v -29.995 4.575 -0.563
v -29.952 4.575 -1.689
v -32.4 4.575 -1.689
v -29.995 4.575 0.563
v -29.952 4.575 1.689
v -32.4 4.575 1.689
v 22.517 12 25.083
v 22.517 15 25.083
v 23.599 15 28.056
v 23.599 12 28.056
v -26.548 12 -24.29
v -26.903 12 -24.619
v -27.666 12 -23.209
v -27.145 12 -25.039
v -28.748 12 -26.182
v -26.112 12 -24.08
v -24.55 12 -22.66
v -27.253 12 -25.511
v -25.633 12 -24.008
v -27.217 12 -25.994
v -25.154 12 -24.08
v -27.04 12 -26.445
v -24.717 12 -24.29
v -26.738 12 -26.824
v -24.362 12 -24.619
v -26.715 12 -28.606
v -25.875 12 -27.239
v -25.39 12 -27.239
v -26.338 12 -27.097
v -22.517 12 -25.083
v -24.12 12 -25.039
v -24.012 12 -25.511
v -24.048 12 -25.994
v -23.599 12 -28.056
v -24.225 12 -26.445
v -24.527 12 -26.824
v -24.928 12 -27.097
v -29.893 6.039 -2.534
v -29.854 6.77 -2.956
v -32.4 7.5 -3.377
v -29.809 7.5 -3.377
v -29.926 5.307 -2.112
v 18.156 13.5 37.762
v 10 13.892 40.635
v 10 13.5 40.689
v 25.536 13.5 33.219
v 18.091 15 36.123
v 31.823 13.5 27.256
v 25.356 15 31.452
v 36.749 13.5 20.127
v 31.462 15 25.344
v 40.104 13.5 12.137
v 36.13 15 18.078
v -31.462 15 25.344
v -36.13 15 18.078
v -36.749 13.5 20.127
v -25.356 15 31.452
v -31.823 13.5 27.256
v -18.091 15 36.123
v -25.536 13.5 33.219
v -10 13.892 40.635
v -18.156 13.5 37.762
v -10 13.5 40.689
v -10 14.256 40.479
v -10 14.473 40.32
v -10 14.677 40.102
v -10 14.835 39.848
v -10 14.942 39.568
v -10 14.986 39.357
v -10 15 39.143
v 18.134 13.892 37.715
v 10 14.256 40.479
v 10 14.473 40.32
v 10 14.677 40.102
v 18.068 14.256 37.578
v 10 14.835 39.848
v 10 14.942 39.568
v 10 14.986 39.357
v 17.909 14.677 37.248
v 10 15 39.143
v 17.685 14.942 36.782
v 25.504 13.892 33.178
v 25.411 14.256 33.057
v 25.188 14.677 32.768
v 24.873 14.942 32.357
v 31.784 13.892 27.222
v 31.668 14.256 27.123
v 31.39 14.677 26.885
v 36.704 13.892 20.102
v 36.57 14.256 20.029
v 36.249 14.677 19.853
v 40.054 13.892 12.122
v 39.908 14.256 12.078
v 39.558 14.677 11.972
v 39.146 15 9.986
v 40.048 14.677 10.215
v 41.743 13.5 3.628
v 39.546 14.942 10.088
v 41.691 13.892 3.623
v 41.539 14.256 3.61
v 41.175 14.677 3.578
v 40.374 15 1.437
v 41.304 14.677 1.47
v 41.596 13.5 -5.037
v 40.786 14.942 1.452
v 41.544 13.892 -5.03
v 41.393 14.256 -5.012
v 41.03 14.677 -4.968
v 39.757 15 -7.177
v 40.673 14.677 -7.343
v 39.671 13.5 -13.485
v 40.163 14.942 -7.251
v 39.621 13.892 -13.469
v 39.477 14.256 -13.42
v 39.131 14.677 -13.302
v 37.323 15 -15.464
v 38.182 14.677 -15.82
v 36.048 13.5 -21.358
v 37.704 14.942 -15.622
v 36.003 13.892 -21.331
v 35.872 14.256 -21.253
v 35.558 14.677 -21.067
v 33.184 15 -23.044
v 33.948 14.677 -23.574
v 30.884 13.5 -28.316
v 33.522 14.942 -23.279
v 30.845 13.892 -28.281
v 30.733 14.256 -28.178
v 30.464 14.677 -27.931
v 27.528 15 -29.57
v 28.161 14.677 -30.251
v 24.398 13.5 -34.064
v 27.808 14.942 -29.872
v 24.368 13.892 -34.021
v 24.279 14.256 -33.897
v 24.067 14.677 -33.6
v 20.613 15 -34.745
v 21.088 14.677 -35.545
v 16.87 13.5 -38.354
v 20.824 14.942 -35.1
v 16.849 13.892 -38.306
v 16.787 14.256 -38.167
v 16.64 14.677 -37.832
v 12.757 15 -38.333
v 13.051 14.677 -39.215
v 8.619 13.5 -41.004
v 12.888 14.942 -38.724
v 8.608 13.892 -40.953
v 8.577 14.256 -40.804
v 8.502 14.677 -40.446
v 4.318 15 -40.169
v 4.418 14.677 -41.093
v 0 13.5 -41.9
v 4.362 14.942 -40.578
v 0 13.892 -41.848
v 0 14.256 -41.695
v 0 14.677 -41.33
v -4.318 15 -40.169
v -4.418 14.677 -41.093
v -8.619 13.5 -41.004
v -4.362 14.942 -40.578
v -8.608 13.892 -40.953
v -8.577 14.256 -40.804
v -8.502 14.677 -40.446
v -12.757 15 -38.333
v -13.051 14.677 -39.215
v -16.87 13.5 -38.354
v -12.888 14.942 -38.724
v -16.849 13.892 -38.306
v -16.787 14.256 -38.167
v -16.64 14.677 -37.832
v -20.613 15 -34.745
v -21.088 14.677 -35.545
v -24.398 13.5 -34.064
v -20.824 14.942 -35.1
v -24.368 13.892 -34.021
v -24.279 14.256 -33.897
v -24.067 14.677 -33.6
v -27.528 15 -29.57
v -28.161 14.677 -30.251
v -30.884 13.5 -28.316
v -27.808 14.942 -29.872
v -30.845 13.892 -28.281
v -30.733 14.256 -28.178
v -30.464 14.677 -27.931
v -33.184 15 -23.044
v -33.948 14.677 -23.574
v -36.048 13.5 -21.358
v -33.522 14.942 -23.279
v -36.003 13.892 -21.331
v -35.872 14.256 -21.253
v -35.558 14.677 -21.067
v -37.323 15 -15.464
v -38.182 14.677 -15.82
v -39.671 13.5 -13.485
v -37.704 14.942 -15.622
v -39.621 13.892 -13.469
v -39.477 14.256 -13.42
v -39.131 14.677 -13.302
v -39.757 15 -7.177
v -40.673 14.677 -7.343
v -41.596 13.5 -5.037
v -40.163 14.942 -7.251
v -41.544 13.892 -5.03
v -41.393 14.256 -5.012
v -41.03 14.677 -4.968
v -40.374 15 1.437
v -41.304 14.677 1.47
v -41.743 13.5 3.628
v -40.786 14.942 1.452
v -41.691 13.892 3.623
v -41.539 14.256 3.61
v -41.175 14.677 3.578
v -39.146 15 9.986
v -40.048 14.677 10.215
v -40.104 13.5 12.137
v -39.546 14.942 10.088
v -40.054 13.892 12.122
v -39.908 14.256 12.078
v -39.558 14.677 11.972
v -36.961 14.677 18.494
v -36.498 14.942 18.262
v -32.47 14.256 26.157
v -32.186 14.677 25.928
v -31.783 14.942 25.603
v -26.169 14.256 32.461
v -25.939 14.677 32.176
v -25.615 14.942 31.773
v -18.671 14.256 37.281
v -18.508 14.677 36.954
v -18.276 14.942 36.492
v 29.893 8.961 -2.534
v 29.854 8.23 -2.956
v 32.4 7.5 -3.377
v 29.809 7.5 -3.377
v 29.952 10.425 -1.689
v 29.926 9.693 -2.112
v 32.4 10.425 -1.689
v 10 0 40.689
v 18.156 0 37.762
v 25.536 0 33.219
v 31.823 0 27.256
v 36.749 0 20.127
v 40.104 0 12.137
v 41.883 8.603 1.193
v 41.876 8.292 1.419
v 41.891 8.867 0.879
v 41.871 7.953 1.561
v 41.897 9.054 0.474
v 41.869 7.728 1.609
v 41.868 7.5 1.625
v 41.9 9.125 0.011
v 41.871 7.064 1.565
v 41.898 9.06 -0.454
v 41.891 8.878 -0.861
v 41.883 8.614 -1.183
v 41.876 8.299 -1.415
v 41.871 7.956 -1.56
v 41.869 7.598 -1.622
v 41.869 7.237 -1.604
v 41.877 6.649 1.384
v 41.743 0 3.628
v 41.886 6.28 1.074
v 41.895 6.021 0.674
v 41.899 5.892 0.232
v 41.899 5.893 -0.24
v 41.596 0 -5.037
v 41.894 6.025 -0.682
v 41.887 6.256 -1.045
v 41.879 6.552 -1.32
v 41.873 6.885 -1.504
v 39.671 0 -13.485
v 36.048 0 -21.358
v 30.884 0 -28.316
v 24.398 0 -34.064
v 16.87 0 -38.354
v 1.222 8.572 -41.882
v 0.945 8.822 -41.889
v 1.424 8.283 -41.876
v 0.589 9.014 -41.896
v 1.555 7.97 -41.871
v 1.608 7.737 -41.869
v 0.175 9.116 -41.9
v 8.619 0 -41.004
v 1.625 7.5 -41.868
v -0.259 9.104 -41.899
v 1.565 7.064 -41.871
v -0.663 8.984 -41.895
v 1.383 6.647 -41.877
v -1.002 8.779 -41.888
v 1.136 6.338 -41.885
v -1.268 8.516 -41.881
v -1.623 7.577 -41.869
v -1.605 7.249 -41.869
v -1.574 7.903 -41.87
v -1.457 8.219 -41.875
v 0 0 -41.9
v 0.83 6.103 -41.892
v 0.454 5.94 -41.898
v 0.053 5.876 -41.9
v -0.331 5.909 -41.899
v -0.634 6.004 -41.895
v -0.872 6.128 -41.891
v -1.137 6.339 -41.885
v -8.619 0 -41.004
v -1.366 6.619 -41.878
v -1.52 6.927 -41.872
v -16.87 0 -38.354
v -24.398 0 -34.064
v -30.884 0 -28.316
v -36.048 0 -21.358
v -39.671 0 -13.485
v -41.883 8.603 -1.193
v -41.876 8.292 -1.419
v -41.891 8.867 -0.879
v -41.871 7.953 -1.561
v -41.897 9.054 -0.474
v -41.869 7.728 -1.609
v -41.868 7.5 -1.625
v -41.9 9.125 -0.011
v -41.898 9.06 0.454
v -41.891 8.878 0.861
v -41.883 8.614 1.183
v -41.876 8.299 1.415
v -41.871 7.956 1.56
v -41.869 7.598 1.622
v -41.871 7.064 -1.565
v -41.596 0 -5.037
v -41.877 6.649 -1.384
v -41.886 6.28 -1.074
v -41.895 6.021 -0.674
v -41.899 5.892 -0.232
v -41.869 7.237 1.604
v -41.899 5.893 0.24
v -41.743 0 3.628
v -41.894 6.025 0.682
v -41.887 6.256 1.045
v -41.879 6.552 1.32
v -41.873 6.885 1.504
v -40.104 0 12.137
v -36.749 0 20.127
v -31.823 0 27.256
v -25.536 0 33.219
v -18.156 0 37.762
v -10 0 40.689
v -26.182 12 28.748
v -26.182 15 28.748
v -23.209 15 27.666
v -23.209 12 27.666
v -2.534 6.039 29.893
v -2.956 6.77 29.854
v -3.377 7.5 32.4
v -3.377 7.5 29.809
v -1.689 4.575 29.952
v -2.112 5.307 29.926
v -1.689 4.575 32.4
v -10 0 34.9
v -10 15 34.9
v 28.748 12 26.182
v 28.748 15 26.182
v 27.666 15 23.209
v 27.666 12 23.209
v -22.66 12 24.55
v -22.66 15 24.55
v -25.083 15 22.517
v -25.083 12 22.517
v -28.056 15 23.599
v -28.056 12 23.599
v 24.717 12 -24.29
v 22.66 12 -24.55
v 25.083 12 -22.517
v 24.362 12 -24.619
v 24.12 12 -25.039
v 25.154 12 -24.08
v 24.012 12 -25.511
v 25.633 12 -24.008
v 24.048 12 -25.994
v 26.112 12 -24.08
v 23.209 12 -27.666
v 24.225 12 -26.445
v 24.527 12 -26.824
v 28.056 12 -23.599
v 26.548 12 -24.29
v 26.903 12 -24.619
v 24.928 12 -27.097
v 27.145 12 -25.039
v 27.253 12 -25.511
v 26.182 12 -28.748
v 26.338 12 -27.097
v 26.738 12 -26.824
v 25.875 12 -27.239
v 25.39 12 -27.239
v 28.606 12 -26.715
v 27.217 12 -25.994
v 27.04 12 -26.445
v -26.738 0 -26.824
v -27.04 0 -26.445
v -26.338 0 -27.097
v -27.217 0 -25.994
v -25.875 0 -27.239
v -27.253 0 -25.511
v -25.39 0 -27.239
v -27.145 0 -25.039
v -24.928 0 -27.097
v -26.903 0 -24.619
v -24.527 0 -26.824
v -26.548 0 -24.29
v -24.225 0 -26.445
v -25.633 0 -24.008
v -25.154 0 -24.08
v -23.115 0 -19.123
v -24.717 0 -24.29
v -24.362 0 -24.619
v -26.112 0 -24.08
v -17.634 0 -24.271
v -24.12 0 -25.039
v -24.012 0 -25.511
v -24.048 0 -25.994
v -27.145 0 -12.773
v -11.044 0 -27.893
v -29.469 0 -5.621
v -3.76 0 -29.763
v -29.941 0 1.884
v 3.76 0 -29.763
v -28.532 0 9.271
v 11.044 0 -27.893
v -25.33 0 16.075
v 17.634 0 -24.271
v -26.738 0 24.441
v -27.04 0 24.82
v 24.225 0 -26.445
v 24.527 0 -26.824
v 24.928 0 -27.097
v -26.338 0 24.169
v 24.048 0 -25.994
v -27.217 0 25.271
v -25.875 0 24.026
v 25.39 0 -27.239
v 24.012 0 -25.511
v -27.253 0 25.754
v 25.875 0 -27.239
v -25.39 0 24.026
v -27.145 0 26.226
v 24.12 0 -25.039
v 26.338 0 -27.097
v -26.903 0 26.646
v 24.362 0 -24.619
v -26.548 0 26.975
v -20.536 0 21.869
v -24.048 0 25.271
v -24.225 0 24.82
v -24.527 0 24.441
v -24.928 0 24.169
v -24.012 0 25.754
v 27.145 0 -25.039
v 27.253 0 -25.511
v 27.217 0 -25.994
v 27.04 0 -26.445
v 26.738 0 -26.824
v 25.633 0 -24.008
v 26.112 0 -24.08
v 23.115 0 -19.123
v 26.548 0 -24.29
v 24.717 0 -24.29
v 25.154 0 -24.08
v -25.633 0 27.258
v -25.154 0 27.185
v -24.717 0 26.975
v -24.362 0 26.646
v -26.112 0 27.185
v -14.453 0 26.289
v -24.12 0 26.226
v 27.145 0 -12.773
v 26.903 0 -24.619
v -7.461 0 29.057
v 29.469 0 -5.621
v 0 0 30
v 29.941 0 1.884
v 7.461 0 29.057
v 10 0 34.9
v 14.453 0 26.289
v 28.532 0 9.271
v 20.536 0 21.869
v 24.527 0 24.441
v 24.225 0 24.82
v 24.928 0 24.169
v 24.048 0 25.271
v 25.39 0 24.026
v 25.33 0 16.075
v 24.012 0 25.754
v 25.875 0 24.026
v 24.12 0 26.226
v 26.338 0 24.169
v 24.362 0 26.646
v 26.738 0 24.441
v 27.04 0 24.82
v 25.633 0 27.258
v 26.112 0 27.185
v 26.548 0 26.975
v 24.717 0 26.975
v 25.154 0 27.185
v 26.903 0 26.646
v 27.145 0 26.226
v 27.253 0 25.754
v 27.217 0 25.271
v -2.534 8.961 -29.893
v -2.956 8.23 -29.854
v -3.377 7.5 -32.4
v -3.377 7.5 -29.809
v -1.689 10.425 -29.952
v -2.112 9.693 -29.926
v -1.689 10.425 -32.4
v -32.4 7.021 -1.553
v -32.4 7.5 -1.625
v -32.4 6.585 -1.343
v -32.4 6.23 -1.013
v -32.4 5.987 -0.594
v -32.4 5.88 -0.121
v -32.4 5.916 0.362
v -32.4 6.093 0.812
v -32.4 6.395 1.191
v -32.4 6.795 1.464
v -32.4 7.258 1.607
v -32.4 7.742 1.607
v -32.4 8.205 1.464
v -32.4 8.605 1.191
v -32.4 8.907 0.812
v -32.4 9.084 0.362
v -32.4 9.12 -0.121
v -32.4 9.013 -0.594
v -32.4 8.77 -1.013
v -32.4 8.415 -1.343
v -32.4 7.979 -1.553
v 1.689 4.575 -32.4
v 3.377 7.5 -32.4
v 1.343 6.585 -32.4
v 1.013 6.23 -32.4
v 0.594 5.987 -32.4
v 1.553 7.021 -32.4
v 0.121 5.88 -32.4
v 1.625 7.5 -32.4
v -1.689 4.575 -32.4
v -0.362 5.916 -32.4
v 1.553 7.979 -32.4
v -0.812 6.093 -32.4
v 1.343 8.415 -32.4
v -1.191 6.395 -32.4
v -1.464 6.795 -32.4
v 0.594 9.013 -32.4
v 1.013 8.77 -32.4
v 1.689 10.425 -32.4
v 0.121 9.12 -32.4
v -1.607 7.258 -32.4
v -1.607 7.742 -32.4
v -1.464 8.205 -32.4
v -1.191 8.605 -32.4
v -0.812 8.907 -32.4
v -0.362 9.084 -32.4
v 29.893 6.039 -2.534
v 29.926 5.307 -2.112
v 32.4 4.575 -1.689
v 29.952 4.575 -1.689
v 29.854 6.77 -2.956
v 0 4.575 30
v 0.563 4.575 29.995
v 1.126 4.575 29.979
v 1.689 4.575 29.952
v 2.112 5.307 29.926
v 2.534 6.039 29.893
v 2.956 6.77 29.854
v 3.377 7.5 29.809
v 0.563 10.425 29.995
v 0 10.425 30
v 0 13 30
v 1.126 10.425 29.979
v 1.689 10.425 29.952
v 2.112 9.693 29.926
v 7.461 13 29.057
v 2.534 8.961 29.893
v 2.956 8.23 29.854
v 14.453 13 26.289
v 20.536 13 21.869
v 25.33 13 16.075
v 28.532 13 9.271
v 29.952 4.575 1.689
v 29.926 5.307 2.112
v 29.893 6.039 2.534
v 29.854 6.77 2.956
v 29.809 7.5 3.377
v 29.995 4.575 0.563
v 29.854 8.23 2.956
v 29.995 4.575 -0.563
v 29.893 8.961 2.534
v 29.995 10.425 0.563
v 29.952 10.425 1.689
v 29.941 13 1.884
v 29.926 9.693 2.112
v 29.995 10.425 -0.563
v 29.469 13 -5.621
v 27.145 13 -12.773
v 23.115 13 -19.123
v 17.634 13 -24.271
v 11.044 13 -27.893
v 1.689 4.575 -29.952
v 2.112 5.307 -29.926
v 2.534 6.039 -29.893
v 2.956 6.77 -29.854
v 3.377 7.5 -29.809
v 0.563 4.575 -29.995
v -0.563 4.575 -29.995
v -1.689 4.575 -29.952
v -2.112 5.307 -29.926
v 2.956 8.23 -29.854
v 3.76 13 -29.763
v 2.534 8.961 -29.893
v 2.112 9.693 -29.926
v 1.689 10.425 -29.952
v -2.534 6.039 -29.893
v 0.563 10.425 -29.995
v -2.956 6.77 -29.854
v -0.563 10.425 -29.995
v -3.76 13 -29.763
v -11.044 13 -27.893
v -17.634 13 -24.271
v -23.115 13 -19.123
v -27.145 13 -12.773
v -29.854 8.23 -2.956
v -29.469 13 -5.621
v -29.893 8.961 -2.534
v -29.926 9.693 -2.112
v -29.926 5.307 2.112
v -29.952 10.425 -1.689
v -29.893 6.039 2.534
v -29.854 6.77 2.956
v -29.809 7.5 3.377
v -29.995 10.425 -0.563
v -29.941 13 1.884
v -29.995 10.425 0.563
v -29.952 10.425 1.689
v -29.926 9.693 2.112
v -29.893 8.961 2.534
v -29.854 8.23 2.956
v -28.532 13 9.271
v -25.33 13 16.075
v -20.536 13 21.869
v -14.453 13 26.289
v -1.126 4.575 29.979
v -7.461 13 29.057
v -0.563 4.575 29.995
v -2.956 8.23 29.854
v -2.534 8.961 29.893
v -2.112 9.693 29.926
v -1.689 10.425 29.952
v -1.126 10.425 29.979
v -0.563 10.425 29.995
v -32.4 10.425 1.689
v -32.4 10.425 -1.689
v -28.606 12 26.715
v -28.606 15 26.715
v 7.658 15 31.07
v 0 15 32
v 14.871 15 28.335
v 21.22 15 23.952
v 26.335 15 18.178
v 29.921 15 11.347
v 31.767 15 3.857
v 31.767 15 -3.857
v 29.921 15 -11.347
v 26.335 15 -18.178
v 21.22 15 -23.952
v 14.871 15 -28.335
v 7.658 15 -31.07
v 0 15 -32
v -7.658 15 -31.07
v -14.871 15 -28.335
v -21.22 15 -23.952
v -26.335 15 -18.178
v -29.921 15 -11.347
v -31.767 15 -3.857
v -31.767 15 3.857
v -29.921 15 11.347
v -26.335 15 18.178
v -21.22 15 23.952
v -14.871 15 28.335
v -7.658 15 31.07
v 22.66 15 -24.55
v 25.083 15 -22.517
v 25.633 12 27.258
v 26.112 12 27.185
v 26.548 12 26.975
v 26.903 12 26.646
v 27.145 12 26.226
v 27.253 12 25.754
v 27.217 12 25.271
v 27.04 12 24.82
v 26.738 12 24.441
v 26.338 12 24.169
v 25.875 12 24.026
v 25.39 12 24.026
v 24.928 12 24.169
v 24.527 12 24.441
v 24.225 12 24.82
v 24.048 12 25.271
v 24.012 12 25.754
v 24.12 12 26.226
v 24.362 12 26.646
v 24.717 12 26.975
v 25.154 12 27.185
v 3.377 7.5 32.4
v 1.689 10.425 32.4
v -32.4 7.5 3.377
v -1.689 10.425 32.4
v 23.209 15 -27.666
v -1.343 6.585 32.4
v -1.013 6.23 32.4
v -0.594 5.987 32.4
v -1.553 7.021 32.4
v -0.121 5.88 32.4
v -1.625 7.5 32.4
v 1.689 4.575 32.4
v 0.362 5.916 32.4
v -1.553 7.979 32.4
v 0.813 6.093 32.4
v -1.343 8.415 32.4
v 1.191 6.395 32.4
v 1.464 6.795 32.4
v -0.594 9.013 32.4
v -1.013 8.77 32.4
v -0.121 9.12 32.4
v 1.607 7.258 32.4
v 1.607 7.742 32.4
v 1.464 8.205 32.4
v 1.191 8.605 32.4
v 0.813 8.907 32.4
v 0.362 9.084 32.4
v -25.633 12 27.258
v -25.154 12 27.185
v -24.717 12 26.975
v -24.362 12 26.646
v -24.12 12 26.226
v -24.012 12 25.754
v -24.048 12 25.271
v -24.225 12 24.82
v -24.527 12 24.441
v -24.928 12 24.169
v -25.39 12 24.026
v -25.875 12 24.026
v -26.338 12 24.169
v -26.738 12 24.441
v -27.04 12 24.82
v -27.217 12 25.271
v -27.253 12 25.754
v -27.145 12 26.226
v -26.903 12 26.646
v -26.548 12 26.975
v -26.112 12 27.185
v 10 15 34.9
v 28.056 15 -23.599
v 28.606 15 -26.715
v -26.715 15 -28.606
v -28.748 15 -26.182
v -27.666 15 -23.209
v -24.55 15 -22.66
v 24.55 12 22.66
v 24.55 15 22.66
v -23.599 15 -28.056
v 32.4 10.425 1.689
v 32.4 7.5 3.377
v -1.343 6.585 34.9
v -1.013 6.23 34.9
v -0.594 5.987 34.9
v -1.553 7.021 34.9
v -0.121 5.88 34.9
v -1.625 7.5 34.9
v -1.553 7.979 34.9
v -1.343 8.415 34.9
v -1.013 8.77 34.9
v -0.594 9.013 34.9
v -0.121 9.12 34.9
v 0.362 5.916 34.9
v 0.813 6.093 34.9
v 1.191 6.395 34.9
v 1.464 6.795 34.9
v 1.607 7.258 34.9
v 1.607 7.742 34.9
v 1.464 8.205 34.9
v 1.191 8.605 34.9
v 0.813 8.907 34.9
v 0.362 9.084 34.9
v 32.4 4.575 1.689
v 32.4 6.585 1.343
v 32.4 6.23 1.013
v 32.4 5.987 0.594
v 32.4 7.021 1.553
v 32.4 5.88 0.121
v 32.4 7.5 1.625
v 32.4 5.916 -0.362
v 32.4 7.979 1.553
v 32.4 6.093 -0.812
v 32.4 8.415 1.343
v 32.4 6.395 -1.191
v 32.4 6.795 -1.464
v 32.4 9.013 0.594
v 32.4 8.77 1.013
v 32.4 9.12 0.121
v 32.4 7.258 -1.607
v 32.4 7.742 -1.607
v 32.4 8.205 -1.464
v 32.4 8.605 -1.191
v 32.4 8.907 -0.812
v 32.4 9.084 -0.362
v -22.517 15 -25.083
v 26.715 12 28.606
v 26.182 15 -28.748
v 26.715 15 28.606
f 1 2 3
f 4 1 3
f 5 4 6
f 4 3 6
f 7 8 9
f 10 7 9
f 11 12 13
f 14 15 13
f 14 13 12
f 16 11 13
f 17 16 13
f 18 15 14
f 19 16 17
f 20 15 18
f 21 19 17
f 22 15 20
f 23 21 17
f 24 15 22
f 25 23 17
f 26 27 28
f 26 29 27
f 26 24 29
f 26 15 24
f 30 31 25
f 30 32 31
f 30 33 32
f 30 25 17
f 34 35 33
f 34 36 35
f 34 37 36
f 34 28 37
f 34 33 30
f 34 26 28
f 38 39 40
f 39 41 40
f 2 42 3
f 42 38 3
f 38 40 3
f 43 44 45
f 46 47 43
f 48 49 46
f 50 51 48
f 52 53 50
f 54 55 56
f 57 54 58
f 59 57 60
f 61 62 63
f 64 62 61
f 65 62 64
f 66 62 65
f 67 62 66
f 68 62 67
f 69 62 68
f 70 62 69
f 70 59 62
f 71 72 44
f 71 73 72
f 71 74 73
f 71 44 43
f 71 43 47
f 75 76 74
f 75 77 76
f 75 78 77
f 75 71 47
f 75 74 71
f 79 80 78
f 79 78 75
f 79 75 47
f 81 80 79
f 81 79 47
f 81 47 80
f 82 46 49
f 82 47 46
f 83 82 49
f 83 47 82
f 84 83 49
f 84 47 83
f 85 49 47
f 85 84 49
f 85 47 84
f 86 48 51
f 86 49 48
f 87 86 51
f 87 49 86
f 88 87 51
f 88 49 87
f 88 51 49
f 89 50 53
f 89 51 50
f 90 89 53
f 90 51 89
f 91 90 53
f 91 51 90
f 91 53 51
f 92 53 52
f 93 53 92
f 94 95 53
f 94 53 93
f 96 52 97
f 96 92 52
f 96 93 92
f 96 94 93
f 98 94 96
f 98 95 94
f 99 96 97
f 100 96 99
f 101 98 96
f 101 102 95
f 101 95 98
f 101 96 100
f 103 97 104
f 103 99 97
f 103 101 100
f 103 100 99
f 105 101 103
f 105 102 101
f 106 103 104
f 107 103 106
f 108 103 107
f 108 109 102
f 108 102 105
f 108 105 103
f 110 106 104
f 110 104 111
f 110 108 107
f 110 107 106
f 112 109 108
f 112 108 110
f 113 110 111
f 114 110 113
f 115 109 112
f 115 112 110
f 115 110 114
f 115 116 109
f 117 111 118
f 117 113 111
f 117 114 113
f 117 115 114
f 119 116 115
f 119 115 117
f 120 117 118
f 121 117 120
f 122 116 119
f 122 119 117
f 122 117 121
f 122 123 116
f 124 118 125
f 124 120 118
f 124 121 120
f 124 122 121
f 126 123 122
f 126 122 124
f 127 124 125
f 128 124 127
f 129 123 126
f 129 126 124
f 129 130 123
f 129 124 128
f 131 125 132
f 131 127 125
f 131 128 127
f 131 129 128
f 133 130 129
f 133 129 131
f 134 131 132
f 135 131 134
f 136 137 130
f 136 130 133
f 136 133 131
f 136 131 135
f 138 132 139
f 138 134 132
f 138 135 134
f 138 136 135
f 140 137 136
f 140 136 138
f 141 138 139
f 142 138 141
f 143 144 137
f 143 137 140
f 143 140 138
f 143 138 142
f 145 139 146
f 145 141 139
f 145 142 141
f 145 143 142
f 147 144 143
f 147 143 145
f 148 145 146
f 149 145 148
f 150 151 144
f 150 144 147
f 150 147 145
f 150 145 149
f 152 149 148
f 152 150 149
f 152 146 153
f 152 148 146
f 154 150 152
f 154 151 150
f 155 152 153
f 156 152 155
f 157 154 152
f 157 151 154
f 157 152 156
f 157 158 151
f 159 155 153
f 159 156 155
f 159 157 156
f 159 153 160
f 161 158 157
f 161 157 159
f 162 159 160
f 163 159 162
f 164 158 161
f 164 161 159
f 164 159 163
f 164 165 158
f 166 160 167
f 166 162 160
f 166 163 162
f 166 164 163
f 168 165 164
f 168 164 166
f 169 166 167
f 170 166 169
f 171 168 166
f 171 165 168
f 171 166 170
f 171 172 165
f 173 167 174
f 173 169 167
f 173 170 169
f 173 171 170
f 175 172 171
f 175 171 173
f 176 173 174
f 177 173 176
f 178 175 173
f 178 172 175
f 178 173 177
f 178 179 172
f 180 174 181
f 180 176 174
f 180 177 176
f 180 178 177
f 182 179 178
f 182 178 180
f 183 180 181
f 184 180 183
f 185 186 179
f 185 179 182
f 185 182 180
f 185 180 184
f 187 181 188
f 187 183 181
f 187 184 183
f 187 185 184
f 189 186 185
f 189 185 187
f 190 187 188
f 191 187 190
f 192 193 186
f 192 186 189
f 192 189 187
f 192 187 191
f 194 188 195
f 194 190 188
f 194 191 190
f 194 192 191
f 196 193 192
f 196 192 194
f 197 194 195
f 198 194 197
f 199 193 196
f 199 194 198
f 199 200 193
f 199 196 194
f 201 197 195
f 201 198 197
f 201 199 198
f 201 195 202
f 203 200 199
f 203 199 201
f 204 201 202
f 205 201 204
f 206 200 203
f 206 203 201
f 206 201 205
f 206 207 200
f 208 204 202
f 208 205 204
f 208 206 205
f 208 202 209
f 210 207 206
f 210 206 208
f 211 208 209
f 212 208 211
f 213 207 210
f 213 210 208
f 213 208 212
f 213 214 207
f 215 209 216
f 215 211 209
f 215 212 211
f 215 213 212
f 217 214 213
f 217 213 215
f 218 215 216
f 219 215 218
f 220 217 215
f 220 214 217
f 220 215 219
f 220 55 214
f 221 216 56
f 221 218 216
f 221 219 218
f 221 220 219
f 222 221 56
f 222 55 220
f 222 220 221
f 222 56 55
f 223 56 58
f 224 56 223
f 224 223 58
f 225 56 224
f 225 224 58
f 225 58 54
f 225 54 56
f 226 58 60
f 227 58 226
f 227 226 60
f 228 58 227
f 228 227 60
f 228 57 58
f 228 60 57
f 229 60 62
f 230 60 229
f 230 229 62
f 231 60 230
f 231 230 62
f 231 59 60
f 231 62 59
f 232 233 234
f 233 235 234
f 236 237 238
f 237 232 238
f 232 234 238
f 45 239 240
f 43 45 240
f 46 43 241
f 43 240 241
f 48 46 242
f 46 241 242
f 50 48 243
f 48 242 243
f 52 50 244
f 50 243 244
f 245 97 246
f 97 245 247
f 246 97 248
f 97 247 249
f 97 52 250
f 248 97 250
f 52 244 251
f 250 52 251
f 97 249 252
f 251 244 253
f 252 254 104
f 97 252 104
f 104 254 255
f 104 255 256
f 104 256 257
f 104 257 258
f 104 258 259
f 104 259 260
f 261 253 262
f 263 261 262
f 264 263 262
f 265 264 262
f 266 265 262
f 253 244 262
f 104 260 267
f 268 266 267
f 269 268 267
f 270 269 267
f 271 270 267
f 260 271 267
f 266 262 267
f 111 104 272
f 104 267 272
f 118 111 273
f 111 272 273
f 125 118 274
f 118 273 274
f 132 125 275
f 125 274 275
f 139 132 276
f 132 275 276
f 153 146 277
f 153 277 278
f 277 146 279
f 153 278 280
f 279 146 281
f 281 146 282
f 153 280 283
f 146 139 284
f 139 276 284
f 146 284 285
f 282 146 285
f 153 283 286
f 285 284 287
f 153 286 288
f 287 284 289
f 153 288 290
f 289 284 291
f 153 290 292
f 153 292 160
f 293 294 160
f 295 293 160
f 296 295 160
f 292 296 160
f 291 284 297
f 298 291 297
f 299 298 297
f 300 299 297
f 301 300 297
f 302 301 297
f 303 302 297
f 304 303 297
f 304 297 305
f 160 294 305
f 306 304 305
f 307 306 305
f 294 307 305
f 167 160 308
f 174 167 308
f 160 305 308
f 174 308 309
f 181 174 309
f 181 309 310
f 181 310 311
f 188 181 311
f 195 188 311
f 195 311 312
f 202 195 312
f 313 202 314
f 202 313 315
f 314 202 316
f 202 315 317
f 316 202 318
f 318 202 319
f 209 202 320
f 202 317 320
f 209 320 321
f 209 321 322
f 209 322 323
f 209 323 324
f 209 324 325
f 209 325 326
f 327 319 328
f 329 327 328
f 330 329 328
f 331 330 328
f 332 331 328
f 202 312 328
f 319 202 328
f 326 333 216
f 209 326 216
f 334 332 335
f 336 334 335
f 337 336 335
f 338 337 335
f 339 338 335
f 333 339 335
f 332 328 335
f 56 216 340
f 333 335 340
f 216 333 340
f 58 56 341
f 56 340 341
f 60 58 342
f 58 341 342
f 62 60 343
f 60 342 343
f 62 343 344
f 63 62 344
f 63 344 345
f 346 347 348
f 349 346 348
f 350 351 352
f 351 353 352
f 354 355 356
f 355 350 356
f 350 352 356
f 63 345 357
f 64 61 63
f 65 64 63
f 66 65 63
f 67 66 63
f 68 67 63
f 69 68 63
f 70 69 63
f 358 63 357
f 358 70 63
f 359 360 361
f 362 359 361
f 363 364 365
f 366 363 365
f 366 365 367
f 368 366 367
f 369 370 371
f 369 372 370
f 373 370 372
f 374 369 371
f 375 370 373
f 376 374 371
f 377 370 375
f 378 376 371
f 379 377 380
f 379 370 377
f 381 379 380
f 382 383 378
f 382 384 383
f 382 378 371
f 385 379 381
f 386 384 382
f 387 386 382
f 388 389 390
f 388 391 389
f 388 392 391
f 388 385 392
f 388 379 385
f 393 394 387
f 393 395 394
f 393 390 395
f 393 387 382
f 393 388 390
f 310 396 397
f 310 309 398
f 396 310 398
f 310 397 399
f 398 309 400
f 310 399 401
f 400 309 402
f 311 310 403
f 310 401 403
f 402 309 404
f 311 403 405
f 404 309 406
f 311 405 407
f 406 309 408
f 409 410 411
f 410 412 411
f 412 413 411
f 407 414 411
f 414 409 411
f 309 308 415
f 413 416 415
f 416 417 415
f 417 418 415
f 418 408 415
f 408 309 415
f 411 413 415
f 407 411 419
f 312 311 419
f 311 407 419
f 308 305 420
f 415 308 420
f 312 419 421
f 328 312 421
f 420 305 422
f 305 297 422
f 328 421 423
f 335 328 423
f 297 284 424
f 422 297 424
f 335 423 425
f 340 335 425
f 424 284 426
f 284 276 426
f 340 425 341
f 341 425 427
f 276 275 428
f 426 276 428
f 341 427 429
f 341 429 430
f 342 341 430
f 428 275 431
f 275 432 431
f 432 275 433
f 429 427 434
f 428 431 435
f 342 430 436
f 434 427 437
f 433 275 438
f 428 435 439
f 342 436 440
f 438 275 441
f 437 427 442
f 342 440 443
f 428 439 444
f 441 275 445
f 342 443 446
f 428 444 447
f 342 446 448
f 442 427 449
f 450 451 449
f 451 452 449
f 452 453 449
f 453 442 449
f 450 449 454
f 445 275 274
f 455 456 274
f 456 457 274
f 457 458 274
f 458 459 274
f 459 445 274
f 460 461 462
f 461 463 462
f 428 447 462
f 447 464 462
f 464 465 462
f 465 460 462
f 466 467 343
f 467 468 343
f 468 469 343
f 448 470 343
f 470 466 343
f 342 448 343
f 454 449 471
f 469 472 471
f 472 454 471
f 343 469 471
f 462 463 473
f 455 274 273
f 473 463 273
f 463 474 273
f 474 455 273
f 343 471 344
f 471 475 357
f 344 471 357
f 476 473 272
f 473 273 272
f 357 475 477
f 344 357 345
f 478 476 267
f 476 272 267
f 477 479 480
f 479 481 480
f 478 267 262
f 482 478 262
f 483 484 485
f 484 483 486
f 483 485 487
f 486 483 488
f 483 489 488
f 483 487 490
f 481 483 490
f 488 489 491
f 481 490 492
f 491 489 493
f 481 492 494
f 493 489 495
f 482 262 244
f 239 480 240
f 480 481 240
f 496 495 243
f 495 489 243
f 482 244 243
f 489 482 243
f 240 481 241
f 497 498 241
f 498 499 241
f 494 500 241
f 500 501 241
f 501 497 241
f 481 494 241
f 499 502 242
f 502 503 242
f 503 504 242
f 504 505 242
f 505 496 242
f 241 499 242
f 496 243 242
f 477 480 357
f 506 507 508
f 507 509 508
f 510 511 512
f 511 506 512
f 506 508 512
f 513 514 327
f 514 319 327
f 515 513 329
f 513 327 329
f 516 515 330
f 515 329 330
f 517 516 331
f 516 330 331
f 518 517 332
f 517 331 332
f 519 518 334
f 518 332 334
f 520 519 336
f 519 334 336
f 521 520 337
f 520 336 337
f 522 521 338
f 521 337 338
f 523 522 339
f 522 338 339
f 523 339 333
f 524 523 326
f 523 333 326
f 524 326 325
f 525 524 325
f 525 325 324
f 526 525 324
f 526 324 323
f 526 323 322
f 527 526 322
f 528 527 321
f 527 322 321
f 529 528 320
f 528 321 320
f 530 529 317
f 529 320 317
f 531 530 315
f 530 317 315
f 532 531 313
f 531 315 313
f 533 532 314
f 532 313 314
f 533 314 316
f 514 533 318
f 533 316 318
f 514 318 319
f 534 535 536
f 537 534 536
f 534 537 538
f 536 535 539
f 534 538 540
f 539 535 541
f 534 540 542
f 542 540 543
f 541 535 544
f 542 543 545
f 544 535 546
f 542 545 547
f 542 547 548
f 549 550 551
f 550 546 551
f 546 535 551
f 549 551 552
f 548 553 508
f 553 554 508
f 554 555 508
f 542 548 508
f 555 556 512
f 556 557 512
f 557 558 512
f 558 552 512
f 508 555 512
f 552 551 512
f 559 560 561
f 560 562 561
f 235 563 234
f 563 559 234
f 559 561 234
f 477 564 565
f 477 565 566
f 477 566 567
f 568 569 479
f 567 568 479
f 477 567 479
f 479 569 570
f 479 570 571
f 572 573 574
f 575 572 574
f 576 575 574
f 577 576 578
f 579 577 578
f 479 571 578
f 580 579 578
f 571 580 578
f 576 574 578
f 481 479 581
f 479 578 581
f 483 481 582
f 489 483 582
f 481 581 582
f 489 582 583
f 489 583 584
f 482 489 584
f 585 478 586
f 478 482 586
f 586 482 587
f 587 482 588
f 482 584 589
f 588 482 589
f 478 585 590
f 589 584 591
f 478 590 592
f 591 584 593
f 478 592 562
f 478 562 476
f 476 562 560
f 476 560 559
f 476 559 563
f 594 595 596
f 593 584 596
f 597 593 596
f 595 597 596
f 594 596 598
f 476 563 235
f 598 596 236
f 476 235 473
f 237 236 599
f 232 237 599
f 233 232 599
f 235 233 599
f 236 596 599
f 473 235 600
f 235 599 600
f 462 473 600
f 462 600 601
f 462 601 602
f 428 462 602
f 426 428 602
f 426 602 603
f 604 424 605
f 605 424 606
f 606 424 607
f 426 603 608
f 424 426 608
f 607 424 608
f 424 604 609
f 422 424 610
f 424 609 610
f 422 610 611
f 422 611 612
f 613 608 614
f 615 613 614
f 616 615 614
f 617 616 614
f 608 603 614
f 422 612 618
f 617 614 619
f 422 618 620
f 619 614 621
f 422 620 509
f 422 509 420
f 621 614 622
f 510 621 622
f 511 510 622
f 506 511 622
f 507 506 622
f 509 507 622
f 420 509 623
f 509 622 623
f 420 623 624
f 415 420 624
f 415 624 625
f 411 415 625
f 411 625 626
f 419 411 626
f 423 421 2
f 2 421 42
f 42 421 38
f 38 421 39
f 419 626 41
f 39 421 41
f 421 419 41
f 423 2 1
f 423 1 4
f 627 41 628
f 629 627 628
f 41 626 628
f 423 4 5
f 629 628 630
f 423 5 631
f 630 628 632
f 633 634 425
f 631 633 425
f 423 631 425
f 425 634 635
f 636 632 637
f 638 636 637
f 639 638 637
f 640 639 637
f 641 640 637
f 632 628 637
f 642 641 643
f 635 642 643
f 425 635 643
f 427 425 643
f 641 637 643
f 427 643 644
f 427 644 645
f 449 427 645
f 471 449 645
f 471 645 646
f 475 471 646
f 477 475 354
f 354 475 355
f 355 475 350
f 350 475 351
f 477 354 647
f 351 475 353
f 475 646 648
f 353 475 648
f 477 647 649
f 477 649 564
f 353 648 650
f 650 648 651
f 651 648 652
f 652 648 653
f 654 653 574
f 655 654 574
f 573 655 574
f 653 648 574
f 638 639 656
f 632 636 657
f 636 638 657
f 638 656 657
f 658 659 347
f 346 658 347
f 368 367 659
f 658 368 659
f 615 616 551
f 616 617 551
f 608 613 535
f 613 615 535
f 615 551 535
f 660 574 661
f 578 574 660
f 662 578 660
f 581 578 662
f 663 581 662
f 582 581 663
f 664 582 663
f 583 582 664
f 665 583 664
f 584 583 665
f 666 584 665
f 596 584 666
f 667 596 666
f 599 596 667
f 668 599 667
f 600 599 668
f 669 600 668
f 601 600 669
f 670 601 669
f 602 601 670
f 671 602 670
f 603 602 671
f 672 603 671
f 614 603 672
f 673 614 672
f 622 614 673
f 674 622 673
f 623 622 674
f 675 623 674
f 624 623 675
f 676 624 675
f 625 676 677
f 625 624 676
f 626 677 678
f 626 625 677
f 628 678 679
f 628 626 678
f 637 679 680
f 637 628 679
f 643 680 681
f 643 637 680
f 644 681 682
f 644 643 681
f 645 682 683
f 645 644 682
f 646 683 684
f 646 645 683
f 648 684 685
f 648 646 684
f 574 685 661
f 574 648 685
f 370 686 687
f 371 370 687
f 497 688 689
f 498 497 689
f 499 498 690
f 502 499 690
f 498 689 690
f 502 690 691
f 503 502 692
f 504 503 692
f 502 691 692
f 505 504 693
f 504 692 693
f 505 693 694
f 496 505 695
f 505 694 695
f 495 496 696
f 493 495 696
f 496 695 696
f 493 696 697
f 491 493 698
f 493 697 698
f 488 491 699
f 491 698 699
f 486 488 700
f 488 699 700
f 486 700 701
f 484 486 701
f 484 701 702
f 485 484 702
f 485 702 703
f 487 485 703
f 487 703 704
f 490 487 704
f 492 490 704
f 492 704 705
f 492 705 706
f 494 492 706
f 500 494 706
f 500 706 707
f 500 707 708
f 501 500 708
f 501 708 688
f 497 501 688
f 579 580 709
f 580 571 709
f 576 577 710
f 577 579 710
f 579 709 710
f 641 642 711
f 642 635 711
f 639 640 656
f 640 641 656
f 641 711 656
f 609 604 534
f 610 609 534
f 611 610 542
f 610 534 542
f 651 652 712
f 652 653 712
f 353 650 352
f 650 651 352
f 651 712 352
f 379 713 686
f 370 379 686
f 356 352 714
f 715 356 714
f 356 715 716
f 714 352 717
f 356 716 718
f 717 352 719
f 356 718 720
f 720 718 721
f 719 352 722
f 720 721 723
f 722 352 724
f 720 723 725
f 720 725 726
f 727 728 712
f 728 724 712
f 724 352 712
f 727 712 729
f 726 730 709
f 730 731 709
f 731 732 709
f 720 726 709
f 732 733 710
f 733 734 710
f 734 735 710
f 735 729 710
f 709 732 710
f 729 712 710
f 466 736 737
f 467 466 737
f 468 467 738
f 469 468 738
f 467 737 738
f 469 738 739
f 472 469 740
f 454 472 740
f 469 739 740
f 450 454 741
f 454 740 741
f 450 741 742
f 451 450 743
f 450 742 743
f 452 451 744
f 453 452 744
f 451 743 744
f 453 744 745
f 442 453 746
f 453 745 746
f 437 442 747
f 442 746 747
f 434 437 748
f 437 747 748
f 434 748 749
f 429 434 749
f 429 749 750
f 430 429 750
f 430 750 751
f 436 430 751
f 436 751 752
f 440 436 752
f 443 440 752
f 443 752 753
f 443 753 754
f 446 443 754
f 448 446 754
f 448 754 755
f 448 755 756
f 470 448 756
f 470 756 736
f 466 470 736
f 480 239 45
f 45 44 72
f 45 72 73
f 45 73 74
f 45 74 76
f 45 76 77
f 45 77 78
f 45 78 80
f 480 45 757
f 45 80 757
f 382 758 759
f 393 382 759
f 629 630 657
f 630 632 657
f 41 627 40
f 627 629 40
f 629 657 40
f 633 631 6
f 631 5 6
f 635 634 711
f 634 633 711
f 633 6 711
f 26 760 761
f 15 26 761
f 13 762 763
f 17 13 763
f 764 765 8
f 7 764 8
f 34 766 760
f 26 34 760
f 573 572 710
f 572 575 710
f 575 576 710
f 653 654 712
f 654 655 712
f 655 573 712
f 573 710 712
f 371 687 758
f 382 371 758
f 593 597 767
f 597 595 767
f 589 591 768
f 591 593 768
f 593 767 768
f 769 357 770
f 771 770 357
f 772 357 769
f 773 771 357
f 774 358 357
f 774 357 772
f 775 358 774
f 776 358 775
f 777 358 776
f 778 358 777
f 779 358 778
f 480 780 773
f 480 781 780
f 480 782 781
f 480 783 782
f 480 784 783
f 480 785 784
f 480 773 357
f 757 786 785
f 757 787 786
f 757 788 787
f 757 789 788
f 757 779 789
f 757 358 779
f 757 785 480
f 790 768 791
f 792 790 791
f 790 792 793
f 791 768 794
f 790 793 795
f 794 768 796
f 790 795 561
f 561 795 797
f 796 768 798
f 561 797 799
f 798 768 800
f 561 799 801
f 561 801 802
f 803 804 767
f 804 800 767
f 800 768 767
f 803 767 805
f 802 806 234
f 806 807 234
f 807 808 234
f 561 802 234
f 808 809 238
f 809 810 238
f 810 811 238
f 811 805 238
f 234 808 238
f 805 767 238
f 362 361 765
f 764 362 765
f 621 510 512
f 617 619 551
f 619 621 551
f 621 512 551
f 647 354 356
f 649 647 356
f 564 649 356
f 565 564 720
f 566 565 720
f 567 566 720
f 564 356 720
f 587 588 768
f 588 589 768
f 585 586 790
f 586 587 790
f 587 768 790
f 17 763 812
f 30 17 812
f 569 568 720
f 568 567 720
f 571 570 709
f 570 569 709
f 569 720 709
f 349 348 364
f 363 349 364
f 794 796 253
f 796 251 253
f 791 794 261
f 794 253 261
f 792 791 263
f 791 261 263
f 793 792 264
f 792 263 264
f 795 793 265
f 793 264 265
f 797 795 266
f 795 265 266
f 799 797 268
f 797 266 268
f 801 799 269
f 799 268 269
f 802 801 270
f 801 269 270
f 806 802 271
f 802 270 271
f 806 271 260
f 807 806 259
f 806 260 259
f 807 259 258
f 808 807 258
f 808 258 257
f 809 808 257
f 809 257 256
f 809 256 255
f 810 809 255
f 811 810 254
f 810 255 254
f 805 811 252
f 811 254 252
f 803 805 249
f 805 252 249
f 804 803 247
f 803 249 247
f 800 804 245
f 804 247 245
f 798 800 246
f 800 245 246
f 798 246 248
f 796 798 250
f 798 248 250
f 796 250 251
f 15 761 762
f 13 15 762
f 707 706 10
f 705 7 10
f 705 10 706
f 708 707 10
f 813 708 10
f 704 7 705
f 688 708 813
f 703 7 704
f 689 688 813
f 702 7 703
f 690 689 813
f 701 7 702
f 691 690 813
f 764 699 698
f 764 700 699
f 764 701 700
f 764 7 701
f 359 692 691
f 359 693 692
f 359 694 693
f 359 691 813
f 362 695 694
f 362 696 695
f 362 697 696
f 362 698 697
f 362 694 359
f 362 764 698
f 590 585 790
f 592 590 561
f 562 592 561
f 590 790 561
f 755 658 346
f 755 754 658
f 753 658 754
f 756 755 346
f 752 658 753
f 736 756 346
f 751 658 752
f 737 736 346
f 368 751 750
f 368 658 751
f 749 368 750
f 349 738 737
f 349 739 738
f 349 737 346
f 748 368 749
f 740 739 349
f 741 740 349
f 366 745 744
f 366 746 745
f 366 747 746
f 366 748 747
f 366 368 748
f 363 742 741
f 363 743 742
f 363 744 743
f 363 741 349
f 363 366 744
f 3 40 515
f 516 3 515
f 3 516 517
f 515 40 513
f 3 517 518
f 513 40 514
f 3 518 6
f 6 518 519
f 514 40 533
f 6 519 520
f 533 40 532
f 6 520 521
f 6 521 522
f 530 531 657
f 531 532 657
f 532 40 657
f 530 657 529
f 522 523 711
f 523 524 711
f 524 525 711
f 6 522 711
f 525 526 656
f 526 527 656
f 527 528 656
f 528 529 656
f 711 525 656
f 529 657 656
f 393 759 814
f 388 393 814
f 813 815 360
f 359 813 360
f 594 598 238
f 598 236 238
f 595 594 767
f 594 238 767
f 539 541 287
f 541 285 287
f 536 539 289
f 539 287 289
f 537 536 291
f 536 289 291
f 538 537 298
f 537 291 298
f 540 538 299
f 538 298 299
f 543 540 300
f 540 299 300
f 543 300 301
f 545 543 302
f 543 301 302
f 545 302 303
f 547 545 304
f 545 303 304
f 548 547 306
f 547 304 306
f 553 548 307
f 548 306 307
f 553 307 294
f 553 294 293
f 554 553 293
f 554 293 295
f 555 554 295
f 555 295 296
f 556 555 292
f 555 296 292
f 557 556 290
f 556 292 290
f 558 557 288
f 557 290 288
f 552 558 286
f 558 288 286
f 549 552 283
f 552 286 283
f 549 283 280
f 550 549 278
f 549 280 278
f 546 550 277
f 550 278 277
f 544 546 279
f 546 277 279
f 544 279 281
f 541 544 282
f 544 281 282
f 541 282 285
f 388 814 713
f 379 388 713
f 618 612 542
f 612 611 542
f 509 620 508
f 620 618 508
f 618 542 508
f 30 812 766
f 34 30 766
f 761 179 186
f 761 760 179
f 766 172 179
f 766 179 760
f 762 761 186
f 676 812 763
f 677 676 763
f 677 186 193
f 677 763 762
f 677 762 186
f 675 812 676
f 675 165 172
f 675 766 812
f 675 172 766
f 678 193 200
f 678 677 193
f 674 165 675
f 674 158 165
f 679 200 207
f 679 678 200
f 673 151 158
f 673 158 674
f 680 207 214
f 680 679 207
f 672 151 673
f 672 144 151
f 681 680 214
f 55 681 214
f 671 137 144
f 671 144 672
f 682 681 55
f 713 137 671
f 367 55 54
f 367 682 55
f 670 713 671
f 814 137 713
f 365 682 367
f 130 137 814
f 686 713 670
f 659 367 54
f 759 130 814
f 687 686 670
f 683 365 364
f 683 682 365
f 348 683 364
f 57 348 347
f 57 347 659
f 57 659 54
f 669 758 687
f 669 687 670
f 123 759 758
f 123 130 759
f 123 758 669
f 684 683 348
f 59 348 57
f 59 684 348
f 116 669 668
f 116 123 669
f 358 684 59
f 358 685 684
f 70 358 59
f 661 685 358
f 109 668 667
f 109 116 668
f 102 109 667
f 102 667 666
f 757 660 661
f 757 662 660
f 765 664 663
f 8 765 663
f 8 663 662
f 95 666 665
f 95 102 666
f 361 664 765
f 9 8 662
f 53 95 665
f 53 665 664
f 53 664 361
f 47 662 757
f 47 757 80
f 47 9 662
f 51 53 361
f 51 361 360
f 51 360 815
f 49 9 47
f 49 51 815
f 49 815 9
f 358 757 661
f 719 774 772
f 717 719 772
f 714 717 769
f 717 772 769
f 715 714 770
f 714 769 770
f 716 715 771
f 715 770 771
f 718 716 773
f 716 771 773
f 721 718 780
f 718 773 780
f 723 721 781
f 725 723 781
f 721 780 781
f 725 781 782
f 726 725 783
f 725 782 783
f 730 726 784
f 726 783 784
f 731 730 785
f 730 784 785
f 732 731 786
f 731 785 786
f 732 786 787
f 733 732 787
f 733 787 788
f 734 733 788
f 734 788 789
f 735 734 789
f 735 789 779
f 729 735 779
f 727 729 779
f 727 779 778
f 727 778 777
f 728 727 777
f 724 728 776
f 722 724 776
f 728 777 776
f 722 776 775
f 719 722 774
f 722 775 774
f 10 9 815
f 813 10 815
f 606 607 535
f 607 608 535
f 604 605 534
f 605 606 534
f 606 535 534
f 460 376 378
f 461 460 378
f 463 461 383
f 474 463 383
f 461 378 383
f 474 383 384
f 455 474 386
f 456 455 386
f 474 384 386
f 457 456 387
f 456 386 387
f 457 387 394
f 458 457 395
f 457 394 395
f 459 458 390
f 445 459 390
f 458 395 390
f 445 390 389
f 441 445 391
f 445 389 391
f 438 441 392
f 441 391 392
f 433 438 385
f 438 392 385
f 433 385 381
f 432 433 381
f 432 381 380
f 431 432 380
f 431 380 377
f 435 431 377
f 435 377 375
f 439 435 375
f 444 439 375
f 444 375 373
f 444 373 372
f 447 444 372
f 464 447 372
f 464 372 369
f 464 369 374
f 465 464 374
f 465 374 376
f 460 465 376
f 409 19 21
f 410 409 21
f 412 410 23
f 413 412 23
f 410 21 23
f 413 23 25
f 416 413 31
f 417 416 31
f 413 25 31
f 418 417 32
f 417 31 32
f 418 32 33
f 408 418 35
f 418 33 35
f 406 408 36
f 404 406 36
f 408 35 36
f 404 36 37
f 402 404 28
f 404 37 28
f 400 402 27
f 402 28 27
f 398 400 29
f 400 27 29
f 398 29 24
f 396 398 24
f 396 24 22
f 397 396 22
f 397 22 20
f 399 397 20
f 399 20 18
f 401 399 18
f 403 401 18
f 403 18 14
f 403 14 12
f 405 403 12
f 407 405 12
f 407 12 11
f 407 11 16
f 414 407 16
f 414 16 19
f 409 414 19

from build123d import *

# Parameters (mm, degrees)
SKETCH1_R               = 41.9
TOP_PART_DEPTH          = 15
SKETCH2_R               = 30
CUT_EXTRUDE1_DEPTH      = 20
FILLET1_R               = 1.5
CHAMFER1_SIZE           = 2
SKETCH8_7_R             = 1.625
CUT_EXTRUDE8_DEPTH      = 3
SKETCH8_R               = 1.625
CUT_EXTRUDE7_DEPTH      = 62.124626857
CUT_EXTRUDE11_DEPTH     = 62.124626857
SKETCH15_R              = 1.625
CUT_EXTRUDE14_DEPTH     = 10
CUT_EXTRUDE15_DEPTH     = 10
CIRPATTERN1_COUNT       = 4
CIRPATTERN2_COUNT       = 4
SKETCH3_R               = 41.9
BOTTOM_PART_DEPTH       = 20
SKETCH6_R               = 37.9
CUT_EXTRUDE3_DEPTH      = 63.076324134
SKETCH_1_W              = 43
SKETCH_1_H              = 43
EXTRUDE_1_DEPTH         = 8
FILLET_1_R              = 5
CUT_EXTRUDE4_DEPTH      = 63.076324134
CUT_EXTRUDE4_DEPTH_BACK = 63.076324134
SKETCH7_R               = 17.5
SKETCH7_R_2             = 1
SKETCH12_W              = 39.5
SKETCH12_H              = 39.5
CUT_EXTRUDE10_DEPTH     = 8.5
FILLET3_R               = 2
SKETCH17_R              = 1.625
CUT_EXTRUDE16_DEPTH     = 63.076324134
SKETCH18_R              = 3
CUT_EXTRUDE17_DEPTH     = 63.076324134
SKETCH19_R              = 2.75
BOSS_EXTRUDE1_DEPTH     = 18.5
SKETCH20_W              = 87.79908129
SKETCH20_H              = 93.09964502
CUT_EXTRUDE18_DEPTH     = 10
SKETCH21_W              = 20
SKETCH21_H              = 8.651798588
CUT_EXTRUDE19_DEPTH     = 15
SKETCH23_R              = 30
CUT_EXTRUDE21_DEPTH     = 65.313451299
SKETCH24_R              = 41.9
CUT_EXTRUDE22_DEPTH     = 10


with BuildPart() as part:
    # Sketch1 → Top-Part (new body)
    with BuildSketch(Plane(origin=(0, 0, 0), x_dir=(1, 0, 0), z_dir=(0, 1, 0))):
        with Locations(Location((0, 0, 0), (0, 0, 270))):
            Circle(SKETCH1_R)
    extrude(amount=TOP_PART_DEPTH)

    # Sketch2 → Cut-Extrude1 (cut)
    with BuildSketch(Plane(origin=(0, 15, 0), x_dir=(1, 0, 0), z_dir=(0, 1, 0))):
        with Locations(Location((0, 0, 0), (0, 0, 270))):
            Circle(SKETCH2_R)
    extrude(amount=-CUT_EXTRUDE1_DEPTH, mode=Mode.SUBTRACT)

    # Fillet1
    fillet1_edges = [part.edges().sort_by_distance(p)[0] for p in [
        (0, 15, -41.9),
    ]]
    fillet(fillet1_edges, radius=FILLET1_R)

    # Chamfer1
    chamfer1_edges = [part.edges().sort_by_distance(p)[0] for p in [
        (0, 15, -30),
    ]]
    chamfer(chamfer1_edges, length=CHAMFER1_SIZE)

    # Sketch8<7> → Cut-Extrude8 (cut)
    # profile 1 of 4: a face of its own
    with BuildSketch(Plane(origin=(0, 15, 0), x_dir=(1, 0, 0), z_dir=(0, 1, 0))):
        Polygon((25.083213555, 22.516777398), (28.056316743, 23.598898462), (28.605724005, 26.714741882), (26.182028081, 28.748464238), (23.208924893, 27.666343174), (22.659517631, 24.550499754), align=None)
        with Locations(Location((25.632620818, 25.632620818, 0), (0, 0, 270))):
            Circle(SKETCH8_7_R, mode=Mode.SUBTRACT)
    # profile 2 of 4: a face of its own
    with BuildSketch(Plane(origin=(0, 15, 0), x_dir=(1, 0, 0), z_dir=(0, 1, 0))):
        Polygon((-22.516777398, 25.083213555), (-23.598898462, 28.056316743), (-26.714741882, 28.605724005), (-28.748464238, 26.182028081), (-27.666343174, 23.208924893), (-24.550499754, 22.659517631), align=None)
        with Locations(Location((-25.632620818, 25.632620818, 0), (0, 0, 270))):
            Circle(SKETCH8_7_R, mode=Mode.SUBTRACT)
    # profile 3 of 4: a face of its own
    with BuildSketch(Plane(origin=(0, 15, 0), x_dir=(1, 0, 0), z_dir=(0, 1, 0))):
        Polygon((22.516777398, -25.083213555), (23.598898462, -28.056316743), (26.714741882, -28.605724005), (28.748464238, -26.182028081), (27.666343174, -23.208924893), (24.550499754, -22.659517631), align=None)
        with Locations(Location((25.632620818, -25.632620818, 0), (0, 0, 270))):
            Circle(SKETCH8_7_R, mode=Mode.SUBTRACT)
    # profile 4 of 4: a face of its own
    with BuildSketch(Plane(origin=(0, 15, 0), x_dir=(1, 0, 0), z_dir=(0, 1, 0))):
        Polygon((-25.083213555, -22.516777398), (-28.056316743, -23.598898462), (-28.605724005, -26.714741882), (-26.182028081, -28.748464238), (-23.208924893, -27.666343174), (-22.659517631, -24.550499754), align=None)
        with Locations(Location((-25.632620818, -25.632620818, 0), (0, 0, 270))):
            Circle(SKETCH8_7_R, mode=Mode.SUBTRACT)
    extrude(amount=-CUT_EXTRUDE8_DEPTH, mode=Mode.SUBTRACT)

    # Sketch8 → Cut-Extrude7 (cut, through all)
    with BuildSketch(Plane(origin=(0, 15, 0), x_dir=(1, 0, 0), z_dir=(0, 1, 0))):
        with Locations(Location((-25.632620818, 25.632620818, 0), (0, 0, 270))):
            Circle(SKETCH8_R)
        with Locations(Location((25.632620818, 25.632620818, 0), (0, 0, 270))):
            Circle(SKETCH8_R)
        with Locations(Location((25.632620818, -25.632620818, 0), (0, 0, 270))):
            Circle(SKETCH8_R)
        with Locations(Location((-25.632620818, -25.632620818, 0), (0, 0, 270))):
            Circle(SKETCH8_R)
    extrude(amount=-CUT_EXTRUDE7_DEPTH, mode=Mode.SUBTRACT)

    # Sketch13 → Cut-Extrude11 (cut, through all)
    with BuildSketch(Plane.XZ):
        with BuildLine():
            Line((-10, 35.519149765), (-10, 40.689187753))
            ThreePointArc((-10, 40.689187753), (0, 41.9), (10, 40.689187753))
            Line((10, 40.689187753), (10, 35.519149765))
            ThreePointArc((10, 35.519149765), (0, 36.9), (-10, 35.519149765))
        make_face()
    extrude(amount=-CUT_EXTRUDE11_DEPTH, mode=Mode.SUBTRACT)

    # Sketch15 → Cut-Extrude14 (cut, symmetric)
    with BuildSketch(Plane.XY.offset(32.4)):
        with Locations(Location((0, 7.5, 0), (0, 0, 180))):
            Circle(SKETCH15_R)
    cut_extrude14 = extrude(amount=CUT_EXTRUDE14_DEPTH, both=True, mode=Mode.SUBTRACT)

    # Sketch16 → Cut-Extrude15 (cut)
    with BuildSketch(Plane.XY.offset(32.4)):
        Polygon((3.377499075, 7.5), (1.688749537, 10.425), (-1.688749537, 10.425), (-3.377499075, 7.5), (-1.688749537, 4.575), (1.688749537, 4.575), align=None)
    cut_extrude15 = extrude(amount=-CUT_EXTRUDE15_DEPTH, mode=Mode.SUBTRACT)

    # CirPattern1: Cut-Extrude14 ×4 about axis
    cirpattern1_axis = Axis((0, 0, 0), (0, 1, 0))
    for i in range(1, CIRPATTERN1_COUNT):
        add(cut_extrude14.rotate(cirpattern1_axis, i * 360 / CIRPATTERN1_COUNT), mode=Mode.SUBTRACT)

    # CirPattern2: Cut-Extrude15 ×4 about axis
    cirpattern2_axis = Axis((0, 0, 0), (0, 1, 0))
    for i in range(1, CIRPATTERN2_COUNT):
        add(cut_extrude15.rotate(cirpattern2_axis, i * 360 / CIRPATTERN2_COUNT), mode=Mode.SUBTRACT)

    # Sketch21 → Cut-Extrude19 (cut)
    with BuildSketch(Plane(origin=(0, 15, 0), x_dir=(1, 0, 0), z_dir=(0, 1, 0))):
        with Locations((0, -39.225899294)):
            Rectangle(SKETCH21_W, SKETCH21_H)
    extrude(amount=-CUT_EXTRUDE19_DEPTH, mode=Mode.SUBTRACT)


with BuildPart() as body_2:
    # Sketch3 → Bottom-Part (new body)
    with BuildSketch(Plane.XZ):
        with Locations(Location((0, 0, 0), (0, 0, 270))):
            Circle(SKETCH3_R)
    extrude(amount=BOTTOM_PART_DEPTH)

    # Sketch6 → Cut-Extrude3 (cut, through all)
    with BuildSketch(Plane(origin=(0, -1.5, 0), x_dir=(1, 0, 0), z_dir=(0, 1, 0))):
        with Locations(Location((0, 0, 0), (0, 0, 270))):
            Circle(SKETCH6_R)
    extrude(amount=-CUT_EXTRUDE3_DEPTH, mode=Mode.SUBTRACT)

    # ｽｹｯﾁ1 → ﾎﾞｽ - 押し出し1 (add)
    with BuildSketch(Plane(origin=(0, 0, 0), x_dir=(1, 0, 0), z_dir=(0, 1, 0))):
        Rectangle(SKETCH_1_W, SKETCH_1_H)
    extrude(amount=EXTRUDE_1_DEPTH)

    # ﾌｨﾚｯﾄ1
    fillet_1_edges = [body_2.edges().sort_by_distance(p)[0] for p in [
        (-21.5, 4, -21.5),
        (-21.5, 4, 21.5),
        (21.5, 4, 21.5),
        (21.5, 4, -21.5),
    ]]
    fillet(fillet_1_edges, radius=FILLET_1_R)

    # Sketch7 → Cut-Extrude4 (cut, two sides: drawn at the far end of the back side and taken through both)
    with BuildSketch(Plane(origin=(0, -1.5, 0), x_dir=(1, 0, 0), z_dir=(0, 1, 0)).offset(-CUT_EXTRUDE4_DEPTH_BACK)):
        with Locations(Location((0, 0, 0), (0, 0, 270))):
            Circle(SKETCH7_R)
        with Locations(Location((17, -17, 0), (0, 0, 270))):
            Circle(SKETCH7_R_2)
        with Locations(Location((-17, -17, 0), (0, 0, 270))):
            Circle(SKETCH7_R_2)
        with Locations(Location((-17, 17, 0), (0, 0, 270))):
            Circle(SKETCH7_R_2)
        with Locations(Location((17, 17, 0), (0, 0, 270))):
            Circle(SKETCH7_R_2)
    extrude(amount=CUT_EXTRUDE4_DEPTH + CUT_EXTRUDE4_DEPTH_BACK, mode=Mode.SUBTRACT)

    # Sketch12 → Cut-Extrude10 (cut)
    with BuildSketch(Plane.XZ.offset(1.5)):
        Rectangle(SKETCH12_W, SKETCH12_H)
    extrude(amount=-CUT_EXTRUDE10_DEPTH, mode=Mode.SUBTRACT)

    # Fillet3
    fillet3_edges = [body_2.edges().sort_by_distance(p)[0] for p in [
        (-19.75, 2.75, -19.75),
        (-19.75, 2.75, 19.75),
        (19.75, 2.75, 19.75),
        (19.75, 2.75, -19.75),
    ]]
    fillet(fillet3_edges, radius=FILLET3_R)

    # Sketch17 → Cut-Extrude16 (cut, through all)
    with BuildSketch(Plane.XZ.offset(1.5)):
        with Locations(Location((25.632620818, -25.632620818, 0), (0, 0, 90))):
            Circle(SKETCH17_R)
        with Locations(Location((-25.632620818, -25.632620818, 0), (0, 0, 90))):
            Circle(SKETCH17_R)
        with Locations(Location((25.632620818, 25.632620818, 0), (0, 0, 90))):
            Circle(SKETCH17_R)
        with Locations(Location((-25.632620818, 25.632620818, 0), (0, 0, 90))):
            Circle(SKETCH17_R)
    extrude(amount=-CUT_EXTRUDE16_DEPTH, mode=Mode.SUBTRACT)

    # Sketch18 → Cut-Extrude17 (cut, through all)
    with BuildSketch(Plane.XZ.offset(1.5)):
        with Locations((-25.632620818, 25.632620818)):
            Circle(SKETCH18_R)
        with Locations((25.632620818, 25.632620818)):
            Circle(SKETCH18_R)
        with Locations((25.632620818, -25.632620818)):
            Circle(SKETCH18_R)
        with Locations((-25.632620818, -25.632620818)):
            Circle(SKETCH18_R)
    extrude(amount=CUT_EXTRUDE17_DEPTH, mode=Mode.SUBTRACT)

    # Sketch19 → Boss-Extrude1 (add)
    # profile 1 of 4: a face of its own
    with BuildSketch(Plane.XZ.offset(1.5)):
        with BuildLine():
            Line((-6, 33), (-6, 37.422052322))
            ThreePointArc((-6, 37.422052322), (0, 37.9), (6, 37.422052322))
            Line((6, 37.422052322), (6, 33))
            ThreePointArc((6, 33), (0, 27), (-6, 33))
        make_face()
        with Locations(Location((0, 33, 0), (0, 0, 270))):
            Circle(SKETCH19_R, mode=Mode.SUBTRACT)
    # profile 2 of 4: a face of its own
    with BuildSketch(Plane.XZ.offset(1.5)):
        with BuildLine():
            Line((33, 6), (37.422052322, 6))
            ThreePointArc((37.422052322, 6), (37.9, 0), (37.422052322, -6))
            Line((37.422052322, -6), (33, -6))
            ThreePointArc((33, -6), (27, 0), (33, 6))
        make_face()
        with Locations(Location((33, 0, 0), (0, 0, 270))):
            Circle(SKETCH19_R, mode=Mode.SUBTRACT)
    # profile 3 of 4: a face of its own
    with BuildSketch(Plane.XZ.offset(1.5)):
        with BuildLine():
            Line((6, -33), (6, -37.422052322))
            ThreePointArc((6, -37.422052322), (0, -37.9), (-6, -37.422052322))
            Line((-6, -37.422052322), (-6, -33))
            ThreePointArc((-6, -33), (0, -27), (6, -33))
        make_face()
        with Locations(Location((0, -33, 0), (0, 0, 270))):
            Circle(SKETCH19_R, mode=Mode.SUBTRACT)
    # profile 4 of 4: a face of its own
    with BuildSketch(Plane.XZ.offset(1.5)):
        with BuildLine():
            Line((-33, -6), (-37.422052322, -6))
            ThreePointArc((-37.422052322, -6), (-37.9, 0), (-37.422052322, 6))
            Line((-37.422052322, 6), (-33, 6))
            ThreePointArc((-33, 6), (-27, 0), (-33, -6))
        make_face()
        with Locations(Location((-33, 0, 0), (0, 0, 270))):
            Circle(SKETCH19_R, mode=Mode.SUBTRACT)
    extrude(amount=BOSS_EXTRUDE1_DEPTH)

    # Sketch20 → Cut-Extrude18 (cut)
    with BuildSketch(Plane.XZ.offset(20)):
        Rectangle(SKETCH20_W, SKETCH20_H)
    extrude(amount=-CUT_EXTRUDE18_DEPTH, mode=Mode.SUBTRACT)

    # Sketch23 → Cut-Extrude21 (cut, through all)
    with BuildSketch(Plane(origin=(0, 15, 0), x_dir=(1, 0, 0), z_dir=(0, 1, 0))):
        with Locations(Location((0, 0, 0), (0, 0, 270))):
            Circle(SKETCH23_R)
    extrude(amount=-CUT_EXTRUDE21_DEPTH, mode=Mode.SUBTRACT)

    # Sketch24 → Cut-Extrude22 (cut)
    with BuildSketch(Plane.XZ.offset(10)):
        Circle(SKETCH24_R)
    extrude(amount=-CUT_EXTRUDE22_DEPTH, mode=Mode.SUBTRACT)


solid = part.part
